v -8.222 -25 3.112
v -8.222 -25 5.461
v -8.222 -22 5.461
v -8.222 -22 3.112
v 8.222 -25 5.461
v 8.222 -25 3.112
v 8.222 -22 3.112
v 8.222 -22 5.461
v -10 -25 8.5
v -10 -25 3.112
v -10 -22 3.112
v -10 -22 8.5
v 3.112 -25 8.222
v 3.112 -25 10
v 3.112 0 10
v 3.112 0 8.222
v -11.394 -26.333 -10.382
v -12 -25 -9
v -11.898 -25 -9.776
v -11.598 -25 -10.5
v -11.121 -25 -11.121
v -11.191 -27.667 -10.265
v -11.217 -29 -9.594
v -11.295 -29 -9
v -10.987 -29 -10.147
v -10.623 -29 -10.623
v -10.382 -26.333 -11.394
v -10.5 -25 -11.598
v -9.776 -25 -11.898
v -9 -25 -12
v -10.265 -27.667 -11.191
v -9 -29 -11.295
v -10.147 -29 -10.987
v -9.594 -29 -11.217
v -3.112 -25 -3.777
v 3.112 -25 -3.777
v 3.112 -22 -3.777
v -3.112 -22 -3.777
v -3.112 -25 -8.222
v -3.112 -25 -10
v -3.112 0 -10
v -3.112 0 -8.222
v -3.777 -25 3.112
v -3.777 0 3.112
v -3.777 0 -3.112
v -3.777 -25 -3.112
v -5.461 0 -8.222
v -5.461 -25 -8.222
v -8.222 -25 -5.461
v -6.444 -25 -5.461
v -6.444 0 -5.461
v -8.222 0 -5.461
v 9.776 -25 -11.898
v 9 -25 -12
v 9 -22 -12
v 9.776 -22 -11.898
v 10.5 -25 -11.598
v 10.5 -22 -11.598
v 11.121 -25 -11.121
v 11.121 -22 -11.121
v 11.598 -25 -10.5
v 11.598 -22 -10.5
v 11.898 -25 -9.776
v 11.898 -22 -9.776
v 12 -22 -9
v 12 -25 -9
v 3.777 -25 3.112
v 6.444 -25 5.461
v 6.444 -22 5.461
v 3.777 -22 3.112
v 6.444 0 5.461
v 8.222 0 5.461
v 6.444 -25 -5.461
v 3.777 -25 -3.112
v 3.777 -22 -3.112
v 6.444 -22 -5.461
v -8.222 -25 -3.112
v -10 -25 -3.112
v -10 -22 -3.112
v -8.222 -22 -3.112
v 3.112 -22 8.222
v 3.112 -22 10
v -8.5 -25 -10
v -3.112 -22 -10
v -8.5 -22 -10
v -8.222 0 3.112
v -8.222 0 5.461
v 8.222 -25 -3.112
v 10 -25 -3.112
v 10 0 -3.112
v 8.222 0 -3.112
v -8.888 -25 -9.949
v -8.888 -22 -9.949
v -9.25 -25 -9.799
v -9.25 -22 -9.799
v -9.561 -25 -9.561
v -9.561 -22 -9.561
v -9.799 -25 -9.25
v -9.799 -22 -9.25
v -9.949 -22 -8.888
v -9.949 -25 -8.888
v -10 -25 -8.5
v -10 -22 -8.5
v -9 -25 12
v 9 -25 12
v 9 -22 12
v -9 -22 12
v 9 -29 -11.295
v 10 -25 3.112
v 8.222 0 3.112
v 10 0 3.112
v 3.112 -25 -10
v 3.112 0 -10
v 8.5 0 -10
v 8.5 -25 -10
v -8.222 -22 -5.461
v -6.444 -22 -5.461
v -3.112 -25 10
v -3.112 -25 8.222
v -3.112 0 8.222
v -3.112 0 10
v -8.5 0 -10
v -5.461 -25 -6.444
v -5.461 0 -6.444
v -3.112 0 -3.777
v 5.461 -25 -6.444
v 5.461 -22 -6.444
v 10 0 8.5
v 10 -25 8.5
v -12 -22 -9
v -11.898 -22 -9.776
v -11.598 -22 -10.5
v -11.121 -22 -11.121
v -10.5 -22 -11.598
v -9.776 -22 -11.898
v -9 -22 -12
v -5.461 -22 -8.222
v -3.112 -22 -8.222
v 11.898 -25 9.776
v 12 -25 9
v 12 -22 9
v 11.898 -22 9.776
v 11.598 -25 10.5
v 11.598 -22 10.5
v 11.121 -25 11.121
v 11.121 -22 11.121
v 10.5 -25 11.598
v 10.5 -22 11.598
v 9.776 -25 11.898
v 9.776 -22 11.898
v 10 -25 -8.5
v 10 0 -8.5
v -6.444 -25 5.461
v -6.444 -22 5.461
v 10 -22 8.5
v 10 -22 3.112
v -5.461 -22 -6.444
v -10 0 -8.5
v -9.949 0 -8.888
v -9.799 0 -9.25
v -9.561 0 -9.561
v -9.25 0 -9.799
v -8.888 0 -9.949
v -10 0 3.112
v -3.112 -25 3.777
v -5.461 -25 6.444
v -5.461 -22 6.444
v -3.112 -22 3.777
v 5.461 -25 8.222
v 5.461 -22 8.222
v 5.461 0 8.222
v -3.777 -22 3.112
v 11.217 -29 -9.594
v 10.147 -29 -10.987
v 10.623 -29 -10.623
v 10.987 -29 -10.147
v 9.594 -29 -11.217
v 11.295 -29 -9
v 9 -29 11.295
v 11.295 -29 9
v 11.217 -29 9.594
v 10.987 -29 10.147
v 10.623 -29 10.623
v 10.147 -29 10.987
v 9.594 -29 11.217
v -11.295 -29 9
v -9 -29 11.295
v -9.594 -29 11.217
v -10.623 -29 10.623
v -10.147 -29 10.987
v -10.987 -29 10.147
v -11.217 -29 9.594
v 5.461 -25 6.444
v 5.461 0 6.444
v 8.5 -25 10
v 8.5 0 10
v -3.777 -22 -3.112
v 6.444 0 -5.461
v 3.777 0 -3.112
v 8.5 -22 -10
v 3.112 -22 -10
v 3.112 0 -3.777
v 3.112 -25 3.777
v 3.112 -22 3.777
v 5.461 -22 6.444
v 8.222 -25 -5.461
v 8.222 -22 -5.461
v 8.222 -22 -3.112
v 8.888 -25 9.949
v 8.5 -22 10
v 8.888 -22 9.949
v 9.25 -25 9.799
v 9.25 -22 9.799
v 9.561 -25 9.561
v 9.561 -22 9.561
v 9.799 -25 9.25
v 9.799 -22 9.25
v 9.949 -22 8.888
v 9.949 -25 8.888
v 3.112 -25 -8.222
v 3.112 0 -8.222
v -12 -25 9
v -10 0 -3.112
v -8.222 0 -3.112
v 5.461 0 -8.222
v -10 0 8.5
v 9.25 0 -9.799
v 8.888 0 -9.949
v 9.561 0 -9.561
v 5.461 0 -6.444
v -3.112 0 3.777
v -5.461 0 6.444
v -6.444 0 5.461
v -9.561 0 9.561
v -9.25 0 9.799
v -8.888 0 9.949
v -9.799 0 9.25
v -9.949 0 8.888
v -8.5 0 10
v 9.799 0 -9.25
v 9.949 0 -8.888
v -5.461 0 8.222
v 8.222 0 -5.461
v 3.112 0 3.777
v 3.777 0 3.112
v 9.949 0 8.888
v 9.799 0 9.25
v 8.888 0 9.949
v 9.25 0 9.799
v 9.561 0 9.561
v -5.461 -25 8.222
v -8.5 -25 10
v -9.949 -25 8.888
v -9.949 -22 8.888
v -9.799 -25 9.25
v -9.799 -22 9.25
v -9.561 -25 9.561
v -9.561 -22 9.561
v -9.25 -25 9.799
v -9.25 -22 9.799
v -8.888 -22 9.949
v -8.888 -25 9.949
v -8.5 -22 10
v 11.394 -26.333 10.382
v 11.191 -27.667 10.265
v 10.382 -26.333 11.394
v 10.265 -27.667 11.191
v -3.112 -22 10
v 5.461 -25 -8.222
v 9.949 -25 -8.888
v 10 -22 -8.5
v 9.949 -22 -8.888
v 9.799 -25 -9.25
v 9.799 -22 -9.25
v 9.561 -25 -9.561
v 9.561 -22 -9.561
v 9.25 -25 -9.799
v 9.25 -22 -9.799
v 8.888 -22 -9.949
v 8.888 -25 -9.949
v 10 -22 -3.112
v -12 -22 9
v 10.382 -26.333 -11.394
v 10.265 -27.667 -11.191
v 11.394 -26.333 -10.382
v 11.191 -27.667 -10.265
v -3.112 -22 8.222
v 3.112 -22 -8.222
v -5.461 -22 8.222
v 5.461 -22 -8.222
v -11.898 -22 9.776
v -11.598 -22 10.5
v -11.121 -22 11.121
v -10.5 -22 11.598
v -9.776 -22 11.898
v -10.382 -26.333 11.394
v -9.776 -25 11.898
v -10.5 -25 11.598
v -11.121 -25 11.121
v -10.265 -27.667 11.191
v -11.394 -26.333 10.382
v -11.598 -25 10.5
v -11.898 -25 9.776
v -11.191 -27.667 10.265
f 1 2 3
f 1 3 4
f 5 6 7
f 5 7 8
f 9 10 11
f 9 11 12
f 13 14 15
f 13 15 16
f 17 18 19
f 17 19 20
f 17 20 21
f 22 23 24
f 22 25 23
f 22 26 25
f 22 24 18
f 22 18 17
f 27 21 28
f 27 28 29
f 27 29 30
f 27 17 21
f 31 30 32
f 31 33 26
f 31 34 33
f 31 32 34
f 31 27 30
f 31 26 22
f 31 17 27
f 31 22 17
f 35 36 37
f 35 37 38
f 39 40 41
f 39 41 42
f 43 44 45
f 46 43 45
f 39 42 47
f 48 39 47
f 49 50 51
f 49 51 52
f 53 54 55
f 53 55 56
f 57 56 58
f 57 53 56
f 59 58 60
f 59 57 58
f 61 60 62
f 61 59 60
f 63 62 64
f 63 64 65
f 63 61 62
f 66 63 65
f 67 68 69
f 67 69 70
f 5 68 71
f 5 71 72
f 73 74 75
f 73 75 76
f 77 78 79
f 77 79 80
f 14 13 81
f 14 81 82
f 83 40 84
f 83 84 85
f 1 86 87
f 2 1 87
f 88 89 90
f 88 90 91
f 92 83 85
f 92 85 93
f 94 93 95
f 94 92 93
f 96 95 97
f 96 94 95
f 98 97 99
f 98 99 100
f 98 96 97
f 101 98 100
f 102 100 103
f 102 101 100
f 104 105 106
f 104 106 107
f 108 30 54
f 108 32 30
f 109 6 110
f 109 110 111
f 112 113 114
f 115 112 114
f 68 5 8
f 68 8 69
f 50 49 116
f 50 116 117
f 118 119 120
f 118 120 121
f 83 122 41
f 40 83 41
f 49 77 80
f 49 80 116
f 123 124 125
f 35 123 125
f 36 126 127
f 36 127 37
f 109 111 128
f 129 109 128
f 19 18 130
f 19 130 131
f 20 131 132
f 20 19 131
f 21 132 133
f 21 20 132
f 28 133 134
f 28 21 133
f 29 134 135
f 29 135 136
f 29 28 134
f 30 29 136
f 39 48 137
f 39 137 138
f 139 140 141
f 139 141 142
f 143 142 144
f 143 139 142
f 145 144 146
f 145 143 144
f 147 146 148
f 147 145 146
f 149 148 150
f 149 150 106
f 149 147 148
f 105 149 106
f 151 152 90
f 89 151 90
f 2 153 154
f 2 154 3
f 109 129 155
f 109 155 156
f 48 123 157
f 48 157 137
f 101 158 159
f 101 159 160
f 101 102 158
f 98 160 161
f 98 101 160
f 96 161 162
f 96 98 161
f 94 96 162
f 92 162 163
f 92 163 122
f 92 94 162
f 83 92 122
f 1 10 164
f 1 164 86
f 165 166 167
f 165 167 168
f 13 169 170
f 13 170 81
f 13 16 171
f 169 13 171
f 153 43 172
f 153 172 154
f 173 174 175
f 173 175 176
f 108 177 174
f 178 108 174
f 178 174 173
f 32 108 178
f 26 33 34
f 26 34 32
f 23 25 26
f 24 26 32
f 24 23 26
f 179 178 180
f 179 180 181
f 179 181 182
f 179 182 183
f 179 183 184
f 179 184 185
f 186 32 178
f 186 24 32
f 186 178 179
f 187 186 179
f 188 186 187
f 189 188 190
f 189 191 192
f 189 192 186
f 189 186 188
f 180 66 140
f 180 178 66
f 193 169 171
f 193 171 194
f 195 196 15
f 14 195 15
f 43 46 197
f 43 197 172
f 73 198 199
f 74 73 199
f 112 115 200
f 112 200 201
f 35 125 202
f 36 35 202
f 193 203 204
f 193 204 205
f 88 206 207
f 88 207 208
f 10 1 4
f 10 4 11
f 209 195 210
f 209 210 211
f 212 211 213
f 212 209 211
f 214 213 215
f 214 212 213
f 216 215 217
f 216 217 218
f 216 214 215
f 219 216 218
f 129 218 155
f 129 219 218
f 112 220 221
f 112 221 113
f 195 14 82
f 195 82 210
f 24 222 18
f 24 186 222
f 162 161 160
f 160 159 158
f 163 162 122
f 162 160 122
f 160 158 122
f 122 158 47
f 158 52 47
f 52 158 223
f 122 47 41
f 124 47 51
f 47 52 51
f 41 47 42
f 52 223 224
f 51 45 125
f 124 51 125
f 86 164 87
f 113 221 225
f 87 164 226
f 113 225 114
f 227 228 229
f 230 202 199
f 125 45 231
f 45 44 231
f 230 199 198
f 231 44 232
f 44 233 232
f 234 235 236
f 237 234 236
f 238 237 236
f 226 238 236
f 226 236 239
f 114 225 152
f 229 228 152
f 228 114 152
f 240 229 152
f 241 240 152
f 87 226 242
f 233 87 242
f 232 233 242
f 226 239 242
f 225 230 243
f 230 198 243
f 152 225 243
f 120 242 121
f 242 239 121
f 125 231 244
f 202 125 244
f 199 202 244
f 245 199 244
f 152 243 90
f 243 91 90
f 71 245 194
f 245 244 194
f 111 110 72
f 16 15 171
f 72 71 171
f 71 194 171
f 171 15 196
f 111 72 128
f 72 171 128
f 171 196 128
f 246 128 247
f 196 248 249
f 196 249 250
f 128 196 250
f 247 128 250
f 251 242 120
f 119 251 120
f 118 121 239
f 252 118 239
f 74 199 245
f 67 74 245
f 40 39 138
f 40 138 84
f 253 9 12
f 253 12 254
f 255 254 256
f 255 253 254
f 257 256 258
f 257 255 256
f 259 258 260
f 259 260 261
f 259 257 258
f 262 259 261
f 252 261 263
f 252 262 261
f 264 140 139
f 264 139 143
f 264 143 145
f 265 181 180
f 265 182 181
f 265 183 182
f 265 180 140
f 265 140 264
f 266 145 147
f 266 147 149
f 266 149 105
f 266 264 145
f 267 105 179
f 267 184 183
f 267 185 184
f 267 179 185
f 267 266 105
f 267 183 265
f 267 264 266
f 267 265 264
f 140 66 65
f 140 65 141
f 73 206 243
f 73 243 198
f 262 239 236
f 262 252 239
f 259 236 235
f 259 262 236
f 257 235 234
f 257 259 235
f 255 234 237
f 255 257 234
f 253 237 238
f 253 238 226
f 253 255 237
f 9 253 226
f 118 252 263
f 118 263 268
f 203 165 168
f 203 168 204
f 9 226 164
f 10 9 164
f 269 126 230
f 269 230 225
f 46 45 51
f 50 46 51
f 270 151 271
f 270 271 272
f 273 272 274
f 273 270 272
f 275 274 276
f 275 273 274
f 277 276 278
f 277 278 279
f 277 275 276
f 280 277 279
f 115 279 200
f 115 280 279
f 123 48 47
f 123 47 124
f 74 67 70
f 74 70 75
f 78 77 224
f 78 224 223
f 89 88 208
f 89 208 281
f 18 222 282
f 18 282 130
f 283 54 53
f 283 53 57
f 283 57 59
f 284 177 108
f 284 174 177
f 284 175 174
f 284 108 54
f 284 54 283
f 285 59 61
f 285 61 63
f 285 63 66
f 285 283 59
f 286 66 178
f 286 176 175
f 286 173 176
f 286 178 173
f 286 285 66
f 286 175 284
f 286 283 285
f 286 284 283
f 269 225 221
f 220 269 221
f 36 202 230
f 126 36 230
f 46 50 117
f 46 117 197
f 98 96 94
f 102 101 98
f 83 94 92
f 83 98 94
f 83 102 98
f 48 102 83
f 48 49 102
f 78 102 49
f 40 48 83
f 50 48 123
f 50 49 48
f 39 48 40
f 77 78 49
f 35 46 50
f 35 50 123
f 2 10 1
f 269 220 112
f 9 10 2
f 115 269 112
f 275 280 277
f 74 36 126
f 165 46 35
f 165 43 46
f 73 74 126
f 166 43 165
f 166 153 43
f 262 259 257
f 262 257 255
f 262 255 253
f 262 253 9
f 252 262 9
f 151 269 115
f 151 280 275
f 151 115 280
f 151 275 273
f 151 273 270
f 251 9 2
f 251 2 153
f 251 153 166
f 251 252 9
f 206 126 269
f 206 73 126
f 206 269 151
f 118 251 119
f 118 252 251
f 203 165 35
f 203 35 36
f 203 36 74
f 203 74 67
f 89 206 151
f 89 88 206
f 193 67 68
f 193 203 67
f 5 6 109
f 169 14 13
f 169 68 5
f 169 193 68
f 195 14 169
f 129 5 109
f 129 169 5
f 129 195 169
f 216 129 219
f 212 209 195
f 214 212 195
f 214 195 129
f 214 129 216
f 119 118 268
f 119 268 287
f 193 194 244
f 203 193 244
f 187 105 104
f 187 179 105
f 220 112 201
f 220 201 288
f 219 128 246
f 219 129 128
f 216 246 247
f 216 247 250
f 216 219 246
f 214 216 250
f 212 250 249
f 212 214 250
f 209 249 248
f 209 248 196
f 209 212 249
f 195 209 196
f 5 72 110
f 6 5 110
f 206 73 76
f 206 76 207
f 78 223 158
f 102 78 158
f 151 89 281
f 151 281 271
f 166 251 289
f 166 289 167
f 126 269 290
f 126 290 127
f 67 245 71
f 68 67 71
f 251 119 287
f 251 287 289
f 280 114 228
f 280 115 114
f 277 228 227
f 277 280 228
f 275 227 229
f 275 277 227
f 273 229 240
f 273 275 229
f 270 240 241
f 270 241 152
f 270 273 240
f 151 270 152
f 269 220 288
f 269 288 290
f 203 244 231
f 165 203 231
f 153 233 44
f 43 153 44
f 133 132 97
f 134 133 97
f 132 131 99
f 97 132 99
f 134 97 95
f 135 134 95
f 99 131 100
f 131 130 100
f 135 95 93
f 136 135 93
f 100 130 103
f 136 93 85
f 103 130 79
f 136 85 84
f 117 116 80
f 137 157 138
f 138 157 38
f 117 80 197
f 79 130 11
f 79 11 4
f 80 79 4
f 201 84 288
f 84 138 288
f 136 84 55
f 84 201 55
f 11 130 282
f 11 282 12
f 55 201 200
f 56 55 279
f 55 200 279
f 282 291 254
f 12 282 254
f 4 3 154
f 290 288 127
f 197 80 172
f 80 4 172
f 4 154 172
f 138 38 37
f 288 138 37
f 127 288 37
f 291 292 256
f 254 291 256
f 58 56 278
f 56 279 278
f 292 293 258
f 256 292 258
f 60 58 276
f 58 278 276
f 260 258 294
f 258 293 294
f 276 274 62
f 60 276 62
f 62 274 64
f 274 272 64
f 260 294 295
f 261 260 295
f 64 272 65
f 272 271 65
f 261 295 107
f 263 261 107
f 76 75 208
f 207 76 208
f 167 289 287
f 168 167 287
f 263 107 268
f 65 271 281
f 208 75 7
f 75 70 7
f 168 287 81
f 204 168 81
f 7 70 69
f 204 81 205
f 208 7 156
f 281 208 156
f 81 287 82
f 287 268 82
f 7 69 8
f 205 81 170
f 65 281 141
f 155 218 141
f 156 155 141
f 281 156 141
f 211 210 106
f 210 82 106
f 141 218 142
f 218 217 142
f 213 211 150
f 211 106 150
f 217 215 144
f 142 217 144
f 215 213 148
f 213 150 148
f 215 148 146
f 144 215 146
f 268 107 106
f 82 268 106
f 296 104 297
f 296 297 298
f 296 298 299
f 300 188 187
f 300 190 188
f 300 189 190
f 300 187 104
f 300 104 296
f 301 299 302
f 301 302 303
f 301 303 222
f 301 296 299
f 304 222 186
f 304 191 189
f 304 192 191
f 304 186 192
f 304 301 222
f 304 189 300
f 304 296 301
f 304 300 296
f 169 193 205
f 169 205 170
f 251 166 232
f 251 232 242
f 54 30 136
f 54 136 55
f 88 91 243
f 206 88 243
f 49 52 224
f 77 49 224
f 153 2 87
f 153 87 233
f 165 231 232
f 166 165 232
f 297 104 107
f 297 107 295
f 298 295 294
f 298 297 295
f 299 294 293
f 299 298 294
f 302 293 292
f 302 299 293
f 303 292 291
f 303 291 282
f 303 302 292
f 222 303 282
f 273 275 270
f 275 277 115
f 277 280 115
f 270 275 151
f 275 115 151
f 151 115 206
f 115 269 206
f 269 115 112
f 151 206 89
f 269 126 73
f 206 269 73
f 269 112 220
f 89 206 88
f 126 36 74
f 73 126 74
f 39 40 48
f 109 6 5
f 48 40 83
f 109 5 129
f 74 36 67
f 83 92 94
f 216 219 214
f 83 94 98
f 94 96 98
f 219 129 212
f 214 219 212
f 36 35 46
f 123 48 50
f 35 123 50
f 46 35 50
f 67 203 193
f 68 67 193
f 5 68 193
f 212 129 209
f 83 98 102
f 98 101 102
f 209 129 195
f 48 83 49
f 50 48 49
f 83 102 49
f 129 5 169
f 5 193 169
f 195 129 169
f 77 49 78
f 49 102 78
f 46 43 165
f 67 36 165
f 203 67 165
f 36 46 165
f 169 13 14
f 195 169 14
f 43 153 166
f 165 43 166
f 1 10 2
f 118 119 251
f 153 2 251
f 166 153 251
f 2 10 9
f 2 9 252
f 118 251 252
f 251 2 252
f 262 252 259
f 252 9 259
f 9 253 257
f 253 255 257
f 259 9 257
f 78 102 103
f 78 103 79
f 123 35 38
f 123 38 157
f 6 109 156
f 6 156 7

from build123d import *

# Parameters (mm, degrees)
F1_DEPTH = 25
F2_R     = 1.5
F4_DEPTH = 4
F4_TAPER = 10
F5_DEPTH = 3


with BuildPart() as f1:
    # F0 (on Front) → F1 (new body)
    with BuildSketch(Plane.XZ):
        Polygon((10, 3.1115), (10, 10), (3.1115, 10), (3.1115, 8.222), (5.461, 8.222), (5.461, 6.444), (3.1115, 3.777), (0, 3.777), (-3.1115, 3.777), (-5.461, 6.444), (-5.461, 8.222), (-3.1115, 8.222), (-3.1115, 10), (-10, 10), (-10, 3.1115), (-8.222, 3.1115), (-8.222, 5.461), (-6.444, 5.461), (-3.777, 3.1115), (-3.777, 0), (-3.777, -3.1115), (-6.444, -5.461), (-8.222, -5.461), (-8.222, -3.1115), (-10, -3.1115), (-10, -10), (-3.1115, -10), (-3.1115, -8.222), (-5.461, -8.222), (-5.461, -6.444), (-3.1115, -3.777), (0, -3.777), (3.1115, -3.777), (5.461, -6.444), (5.461, -8.222), (3.1115, -8.222), (3.1115, -10), (10, -10), (10, -3.1115), (8.222, -3.1115), (8.222, -5.461), (6.444, -5.461), (3.777, -3.1115), (3.777, 0), (3.777, 3.1115), (6.444, 5.461), (8.222, 5.461), (8.222, 3.1115), align=None)
    extrude(amount=F1_DEPTH)

    # F2
    f2_edges = [f1.edges().sort_by_distance(p)[0] for p in [
        (-10, -12.5, 10),
        (10, -12.5, 10),
        (10, -12.5, -10),
        (-10, -12.5, -10),
    ]]
    fillet(f2_edges, radius=F2_R)


with BuildPart() as f4:
    # F3 (on face) → F4 (new body)
    with BuildSketch(Plane.XZ.offset(25)):
        with BuildLine():
            Line((9, 12), (-9, 12))
            ThreePointArc((-9, 12), (-11.1213203436, 11.1213203436), (-12, 9))
            Line((-12, 9), (-12, -9))
            ThreePointArc((-12, -9), (-11.1213203436, -11.1213203436), (-9, -12))
            Line((-9, -12), (9, -12))
            ThreePointArc((9, -12), (11.1213203436, -11.1213203436), (12, -9))
            Line((12, -9), (12, 9))
            ThreePointArc((12, 9), (11.1213203436, 11.1213203436), (9, 12))
        make_face()
        with BuildLine():
            Line((10, 8.5), (10, 3.1115))
            Line((10, 3.1115), (8.222, 3.1115))
            Line((8.222, 3.1115), (8.222, 5.461))
            Line((8.222, 5.461), (6.444, 5.461))
            Line((6.444, 5.461), (3.777, 3.1115))
            Line((3.777, 3.1115), (3.777, -3.1115))
            Line((3.777, -3.1115), (6.444, -5.461))
            Line((6.444, -5.461), (8.222, -5.461))
            Line((8.222, -5.461), (8.222, -3.1115))
            Line((8.222, -3.1115), (10, -3.1115))
            Line((10, -3.1115), (10, -8.5))
            ThreePointArc((10, -8.5), (9.5606601718, -9.5606601718), (8.5, -10))
            Line((8.5, -10), (3.1115, -10))
            Line((3.1115, -10), (3.1115, -8.222))
            Line((3.1115, -8.222), (5.461, -8.222))
            Line((5.461, -8.222), (5.461, -6.444))
            Line((5.461, -6.444), (3.1115, -3.777))
            Line((3.1115, -3.777), (-3.1115, -3.777))
            Line((-3.1115, -3.777), (-5.461, -6.444))
            Line((-5.461, -6.444), (-5.461, -8.222))
            Line((-5.461, -8.222), (-3.1115, -8.222))
            Line((-3.1115, -8.222), (-3.1115, -10))
            Line((-3.1115, -10), (-8.5, -10))
            ThreePointArc((-8.5, -10), (-9.5606601718, -9.5606601718), (-10, -8.5))
            Line((-10, -8.5), (-10, -3.1115))
            Line((-10, -3.1115), (-8.222, -3.1115))
            Line((-8.222, -3.1115), (-8.222, -5.461))
            Line((-8.222, -5.461), (-6.444, -5.461))
            Line((-6.444, -5.461), (-3.777, -3.1115))
            Line((-3.777, -3.1115), (-3.777, 3.1115))
            Line((-3.777, 3.1115), (-6.444, 5.461))
            Line((-6.444, 5.461), (-8.222, 5.461))
            Line((-8.222, 5.461), (-8.222, 3.1115))
            Line((-8.222, 3.1115), (-10, 3.1115))
            Line((-10, 3.1115), (-10, 8.5))
            ThreePointArc((-10, 8.5), (-9.5606601718, 9.5606601718), (-8.5, 10))
            Line((-8.5, 10), (-3.1115, 10))
            Line((-3.1115, 10), (-3.1115, 8.222))
            Line((-3.1115, 8.222), (-5.461, 8.222))
            Line((-5.461, 8.222), (-5.461, 6.444))
            Line((-5.461, 6.444), (-3.1115, 3.777))
            Line((-3.1115, 3.777), (3.1115, 3.777))
            Line((3.1115, 3.777), (5.461, 6.444))
            Line((5.461, 6.444), (5.461, 8.222))
            Line((5.461, 8.222), (3.1115, 8.222))
            Line((3.1115, 8.222), (3.1115, 10))
            Line((3.1115, 10), (8.5, 10))
            ThreePointArc((8.5, 10), (9.5606601718, 9.5606601718), (10, 8.5))
        make_face(mode=Mode.SUBTRACT)
        with BuildLine():
            Line((8.222, 3.1115), (10, 3.1115))
            Line((10, 3.1115), (10, 8.5))
            ThreePointArc((10, 8.5), (9.5606601718, 9.5606601718), (8.5, 10))
            Line((8.5, 10), (3.1115, 10))
            Line((3.1115, 10), (3.1115, 8.222))
            Line((3.1115, 8.222), (5.461, 8.222))
            Line((5.461, 8.222), (5.461, 6.444))
            Line((5.461, 6.444), (3.1115, 3.777))
            Line((3.1115, 3.777), (-3.1115, 3.777))
            Line((-3.1115, 3.777), (-5.461, 6.444))
            Line((-5.461, 6.444), (-5.461, 8.222))
            Line((-5.461, 8.222), (-3.1115, 8.222))
            Line((-3.1115, 8.222), (-3.1115, 10))
            Line((-3.1115, 10), (-8.5, 10))
            ThreePointArc((-8.5, 10), (-9.5606601718, 9.5606601718), (-10, 8.5))
            Line((-10, 8.5), (-10, 3.1115))
            Line((-10, 3.1115), (-8.222, 3.1115))
            Line((-8.222, 3.1115), (-8.222, 5.461))
            Line((-8.222, 5.461), (-6.444, 5.461))
            Line((-6.444, 5.461), (-3.777, 3.1115))
            Line((-3.777, 3.1115), (-3.777, -3.1115))
            Line((-3.777, -3.1115), (-6.444, -5.461))
            Line((-6.444, -5.461), (-8.222, -5.461))
            Line((-8.222, -5.461), (-8.222, -3.1115))
            Line((-8.222, -3.1115), (-10, -3.1115))
            Line((-10, -3.1115), (-10, -8.5))
            ThreePointArc((-10, -8.5), (-9.5606601718, -9.5606601718), (-8.5, -10))
            Line((-8.5, -10), (-3.1115, -10))
            Line((-3.1115, -10), (-3.1115, -8.222))
            Line((-3.1115, -8.222), (-5.461, -8.222))
            Line((-5.461, -8.222), (-5.461, -6.444))
            Line((-5.461, -6.444), (-3.1115, -3.777))
            Line((-3.1115, -3.777), (3.1115, -3.777))
            Line((3.1115, -3.777), (5.461, -6.444))
            Line((5.461, -6.444), (5.461, -8.222))
            Line((5.461, -8.222), (3.1115, -8.222))
            Line((3.1115, -8.222), (3.1115, -10))
            Line((3.1115, -10), (8.5, -10))
            ThreePointArc((8.5, -10), (9.5606601718, -9.5606601718), (10, -8.5))
            Line((10, -8.5), (10, -3.1115))
            Line((10, -3.1115), (8.222, -3.1115))
            Line((8.222, -3.1115), (8.222, -5.461))
            Line((8.222, -5.461), (6.444, -5.461))
            Line((6.444, -5.461), (3.777, -3.1115))
            Line((3.777, -3.1115), (3.777, 3.1115))
            Line((3.777, 3.1115), (6.444, 5.461))
            Line((6.444, 5.461), (8.222, 5.461))
            Line((8.222, 5.461), (8.222, 3.1115))
        make_face()
    extrude(amount=F4_DEPTH, taper=F4_TAPER)

    # F3 (on face) → F5 (join)
    with BuildSketch(Plane.XZ.offset(25)):
        with BuildLine():
            Line((9, 12), (-9, 12))
            ThreePointArc((-9, 12), (-11.1213203436, 11.1213203436), (-12, 9))
            Line((-12, 9), (-12, -9))
            ThreePointArc((-12, -9), (-11.1213203436, -11.1213203436), (-9, -12))
            Line((-9, -12), (9, -12))
            ThreePointArc((9, -12), (11.1213203436, -11.1213203436), (12, -9))
            Line((12, -9), (12, 9))
            ThreePointArc((12, 9), (11.1213203436, 11.1213203436), (9, 12))
        make_face()
        with BuildLine():
            Line((10, 8.5), (10, 3.1115))
            Line((10, 3.1115), (8.222, 3.1115))
            Line((8.222, 3.1115), (8.222, 5.461))
            Line((8.222, 5.461), (6.444, 5.461))
            Line((6.444, 5.461), (3.777, 3.1115))
            Line((3.777, 3.1115), (3.777, -3.1115))
            Line((3.777, -3.1115), (6.444, -5.461))
            Line((6.444, -5.461), (8.222, -5.461))
            Line((8.222, -5.461), (8.222, -3.1115))
            Line((8.222, -3.1115), (10, -3.1115))
            Line((10, -3.1115), (10, -8.5))
            ThreePointArc((10, -8.5), (9.5606601718, -9.5606601718), (8.5, -10))
            Line((8.5, -10), (3.1115, -10))
            Line((3.1115, -10), (3.1115, -8.222))
            Line((3.1115, -8.222), (5.461, -8.222))
            Line((5.461, -8.222), (5.461, -6.444))
            Line((5.461, -6.444), (3.1115, -3.777))
            Line((3.1115, -3.777), (-3.1115, -3.777))
            Line((-3.1115, -3.777), (-5.461, -6.444))
            Line((-5.461, -6.444), (-5.461, -8.222))
            Line((-5.461, -8.222), (-3.1115, -8.222))
            Line((-3.1115, -8.222), (-3.1115, -10))
            Line((-3.1115, -10), (-8.5, -10))
            ThreePointArc((-8.5, -10), (-9.5606601718, -9.5606601718), (-10, -8.5))
            Line((-10, -8.5), (-10, -3.1115))
            Line((-10, -3.1115), (-8.222, -3.1115))
            Line((-8.222, -3.1115), (-8.222, -5.461))
            Line((-8.222, -5.461), (-6.444, -5.461))
            Line((-6.444, -5.461), (-3.777, -3.1115))
            Line((-3.777, -3.1115), (-3.777, 3.1115))
            Line((-3.777, 3.1115), (-6.444, 5.461))
            Line((-6.444, 5.461), (-8.222, 5.461))
            Line((-8.222, 5.461), (-8.222, 3.1115))
            Line((-8.222, 3.1115), (-10, 3.1115))
            Line((-10, 3.1115), (-10, 8.5))
            ThreePointArc((-10, 8.5), (-9.5606601718, 9.5606601718), (-8.5, 10))
            Line((-8.5, 10), (-3.1115, 10))
            Line((-3.1115, 10), (-3.1115, 8.222))
            Line((-3.1115, 8.222), (-5.461, 8.222))
            Line((-5.461, 8.222), (-5.461, 6.444))
            Line((-5.461, 6.444), (-3.1115, 3.777))
            Line((-3.1115, 3.777), (3.1115, 3.777))
            Line((3.1115, 3.777), (5.461, 6.444))
            Line((5.461, 6.444), (5.461, 8.222))
            Line((5.461, 8.222), (3.1115, 8.222))
            Line((3.1115, 8.222), (3.1115, 10))
            Line((3.1115, 10), (8.5, 10))
            ThreePointArc((8.5, 10), (9.5606601718, 9.5606601718), (10, 8.5))
        make_face(mode=Mode.SUBTRACT)
    extrude(amount=-F5_DEPTH)


solid = Compound([f1.part, f4.part])
